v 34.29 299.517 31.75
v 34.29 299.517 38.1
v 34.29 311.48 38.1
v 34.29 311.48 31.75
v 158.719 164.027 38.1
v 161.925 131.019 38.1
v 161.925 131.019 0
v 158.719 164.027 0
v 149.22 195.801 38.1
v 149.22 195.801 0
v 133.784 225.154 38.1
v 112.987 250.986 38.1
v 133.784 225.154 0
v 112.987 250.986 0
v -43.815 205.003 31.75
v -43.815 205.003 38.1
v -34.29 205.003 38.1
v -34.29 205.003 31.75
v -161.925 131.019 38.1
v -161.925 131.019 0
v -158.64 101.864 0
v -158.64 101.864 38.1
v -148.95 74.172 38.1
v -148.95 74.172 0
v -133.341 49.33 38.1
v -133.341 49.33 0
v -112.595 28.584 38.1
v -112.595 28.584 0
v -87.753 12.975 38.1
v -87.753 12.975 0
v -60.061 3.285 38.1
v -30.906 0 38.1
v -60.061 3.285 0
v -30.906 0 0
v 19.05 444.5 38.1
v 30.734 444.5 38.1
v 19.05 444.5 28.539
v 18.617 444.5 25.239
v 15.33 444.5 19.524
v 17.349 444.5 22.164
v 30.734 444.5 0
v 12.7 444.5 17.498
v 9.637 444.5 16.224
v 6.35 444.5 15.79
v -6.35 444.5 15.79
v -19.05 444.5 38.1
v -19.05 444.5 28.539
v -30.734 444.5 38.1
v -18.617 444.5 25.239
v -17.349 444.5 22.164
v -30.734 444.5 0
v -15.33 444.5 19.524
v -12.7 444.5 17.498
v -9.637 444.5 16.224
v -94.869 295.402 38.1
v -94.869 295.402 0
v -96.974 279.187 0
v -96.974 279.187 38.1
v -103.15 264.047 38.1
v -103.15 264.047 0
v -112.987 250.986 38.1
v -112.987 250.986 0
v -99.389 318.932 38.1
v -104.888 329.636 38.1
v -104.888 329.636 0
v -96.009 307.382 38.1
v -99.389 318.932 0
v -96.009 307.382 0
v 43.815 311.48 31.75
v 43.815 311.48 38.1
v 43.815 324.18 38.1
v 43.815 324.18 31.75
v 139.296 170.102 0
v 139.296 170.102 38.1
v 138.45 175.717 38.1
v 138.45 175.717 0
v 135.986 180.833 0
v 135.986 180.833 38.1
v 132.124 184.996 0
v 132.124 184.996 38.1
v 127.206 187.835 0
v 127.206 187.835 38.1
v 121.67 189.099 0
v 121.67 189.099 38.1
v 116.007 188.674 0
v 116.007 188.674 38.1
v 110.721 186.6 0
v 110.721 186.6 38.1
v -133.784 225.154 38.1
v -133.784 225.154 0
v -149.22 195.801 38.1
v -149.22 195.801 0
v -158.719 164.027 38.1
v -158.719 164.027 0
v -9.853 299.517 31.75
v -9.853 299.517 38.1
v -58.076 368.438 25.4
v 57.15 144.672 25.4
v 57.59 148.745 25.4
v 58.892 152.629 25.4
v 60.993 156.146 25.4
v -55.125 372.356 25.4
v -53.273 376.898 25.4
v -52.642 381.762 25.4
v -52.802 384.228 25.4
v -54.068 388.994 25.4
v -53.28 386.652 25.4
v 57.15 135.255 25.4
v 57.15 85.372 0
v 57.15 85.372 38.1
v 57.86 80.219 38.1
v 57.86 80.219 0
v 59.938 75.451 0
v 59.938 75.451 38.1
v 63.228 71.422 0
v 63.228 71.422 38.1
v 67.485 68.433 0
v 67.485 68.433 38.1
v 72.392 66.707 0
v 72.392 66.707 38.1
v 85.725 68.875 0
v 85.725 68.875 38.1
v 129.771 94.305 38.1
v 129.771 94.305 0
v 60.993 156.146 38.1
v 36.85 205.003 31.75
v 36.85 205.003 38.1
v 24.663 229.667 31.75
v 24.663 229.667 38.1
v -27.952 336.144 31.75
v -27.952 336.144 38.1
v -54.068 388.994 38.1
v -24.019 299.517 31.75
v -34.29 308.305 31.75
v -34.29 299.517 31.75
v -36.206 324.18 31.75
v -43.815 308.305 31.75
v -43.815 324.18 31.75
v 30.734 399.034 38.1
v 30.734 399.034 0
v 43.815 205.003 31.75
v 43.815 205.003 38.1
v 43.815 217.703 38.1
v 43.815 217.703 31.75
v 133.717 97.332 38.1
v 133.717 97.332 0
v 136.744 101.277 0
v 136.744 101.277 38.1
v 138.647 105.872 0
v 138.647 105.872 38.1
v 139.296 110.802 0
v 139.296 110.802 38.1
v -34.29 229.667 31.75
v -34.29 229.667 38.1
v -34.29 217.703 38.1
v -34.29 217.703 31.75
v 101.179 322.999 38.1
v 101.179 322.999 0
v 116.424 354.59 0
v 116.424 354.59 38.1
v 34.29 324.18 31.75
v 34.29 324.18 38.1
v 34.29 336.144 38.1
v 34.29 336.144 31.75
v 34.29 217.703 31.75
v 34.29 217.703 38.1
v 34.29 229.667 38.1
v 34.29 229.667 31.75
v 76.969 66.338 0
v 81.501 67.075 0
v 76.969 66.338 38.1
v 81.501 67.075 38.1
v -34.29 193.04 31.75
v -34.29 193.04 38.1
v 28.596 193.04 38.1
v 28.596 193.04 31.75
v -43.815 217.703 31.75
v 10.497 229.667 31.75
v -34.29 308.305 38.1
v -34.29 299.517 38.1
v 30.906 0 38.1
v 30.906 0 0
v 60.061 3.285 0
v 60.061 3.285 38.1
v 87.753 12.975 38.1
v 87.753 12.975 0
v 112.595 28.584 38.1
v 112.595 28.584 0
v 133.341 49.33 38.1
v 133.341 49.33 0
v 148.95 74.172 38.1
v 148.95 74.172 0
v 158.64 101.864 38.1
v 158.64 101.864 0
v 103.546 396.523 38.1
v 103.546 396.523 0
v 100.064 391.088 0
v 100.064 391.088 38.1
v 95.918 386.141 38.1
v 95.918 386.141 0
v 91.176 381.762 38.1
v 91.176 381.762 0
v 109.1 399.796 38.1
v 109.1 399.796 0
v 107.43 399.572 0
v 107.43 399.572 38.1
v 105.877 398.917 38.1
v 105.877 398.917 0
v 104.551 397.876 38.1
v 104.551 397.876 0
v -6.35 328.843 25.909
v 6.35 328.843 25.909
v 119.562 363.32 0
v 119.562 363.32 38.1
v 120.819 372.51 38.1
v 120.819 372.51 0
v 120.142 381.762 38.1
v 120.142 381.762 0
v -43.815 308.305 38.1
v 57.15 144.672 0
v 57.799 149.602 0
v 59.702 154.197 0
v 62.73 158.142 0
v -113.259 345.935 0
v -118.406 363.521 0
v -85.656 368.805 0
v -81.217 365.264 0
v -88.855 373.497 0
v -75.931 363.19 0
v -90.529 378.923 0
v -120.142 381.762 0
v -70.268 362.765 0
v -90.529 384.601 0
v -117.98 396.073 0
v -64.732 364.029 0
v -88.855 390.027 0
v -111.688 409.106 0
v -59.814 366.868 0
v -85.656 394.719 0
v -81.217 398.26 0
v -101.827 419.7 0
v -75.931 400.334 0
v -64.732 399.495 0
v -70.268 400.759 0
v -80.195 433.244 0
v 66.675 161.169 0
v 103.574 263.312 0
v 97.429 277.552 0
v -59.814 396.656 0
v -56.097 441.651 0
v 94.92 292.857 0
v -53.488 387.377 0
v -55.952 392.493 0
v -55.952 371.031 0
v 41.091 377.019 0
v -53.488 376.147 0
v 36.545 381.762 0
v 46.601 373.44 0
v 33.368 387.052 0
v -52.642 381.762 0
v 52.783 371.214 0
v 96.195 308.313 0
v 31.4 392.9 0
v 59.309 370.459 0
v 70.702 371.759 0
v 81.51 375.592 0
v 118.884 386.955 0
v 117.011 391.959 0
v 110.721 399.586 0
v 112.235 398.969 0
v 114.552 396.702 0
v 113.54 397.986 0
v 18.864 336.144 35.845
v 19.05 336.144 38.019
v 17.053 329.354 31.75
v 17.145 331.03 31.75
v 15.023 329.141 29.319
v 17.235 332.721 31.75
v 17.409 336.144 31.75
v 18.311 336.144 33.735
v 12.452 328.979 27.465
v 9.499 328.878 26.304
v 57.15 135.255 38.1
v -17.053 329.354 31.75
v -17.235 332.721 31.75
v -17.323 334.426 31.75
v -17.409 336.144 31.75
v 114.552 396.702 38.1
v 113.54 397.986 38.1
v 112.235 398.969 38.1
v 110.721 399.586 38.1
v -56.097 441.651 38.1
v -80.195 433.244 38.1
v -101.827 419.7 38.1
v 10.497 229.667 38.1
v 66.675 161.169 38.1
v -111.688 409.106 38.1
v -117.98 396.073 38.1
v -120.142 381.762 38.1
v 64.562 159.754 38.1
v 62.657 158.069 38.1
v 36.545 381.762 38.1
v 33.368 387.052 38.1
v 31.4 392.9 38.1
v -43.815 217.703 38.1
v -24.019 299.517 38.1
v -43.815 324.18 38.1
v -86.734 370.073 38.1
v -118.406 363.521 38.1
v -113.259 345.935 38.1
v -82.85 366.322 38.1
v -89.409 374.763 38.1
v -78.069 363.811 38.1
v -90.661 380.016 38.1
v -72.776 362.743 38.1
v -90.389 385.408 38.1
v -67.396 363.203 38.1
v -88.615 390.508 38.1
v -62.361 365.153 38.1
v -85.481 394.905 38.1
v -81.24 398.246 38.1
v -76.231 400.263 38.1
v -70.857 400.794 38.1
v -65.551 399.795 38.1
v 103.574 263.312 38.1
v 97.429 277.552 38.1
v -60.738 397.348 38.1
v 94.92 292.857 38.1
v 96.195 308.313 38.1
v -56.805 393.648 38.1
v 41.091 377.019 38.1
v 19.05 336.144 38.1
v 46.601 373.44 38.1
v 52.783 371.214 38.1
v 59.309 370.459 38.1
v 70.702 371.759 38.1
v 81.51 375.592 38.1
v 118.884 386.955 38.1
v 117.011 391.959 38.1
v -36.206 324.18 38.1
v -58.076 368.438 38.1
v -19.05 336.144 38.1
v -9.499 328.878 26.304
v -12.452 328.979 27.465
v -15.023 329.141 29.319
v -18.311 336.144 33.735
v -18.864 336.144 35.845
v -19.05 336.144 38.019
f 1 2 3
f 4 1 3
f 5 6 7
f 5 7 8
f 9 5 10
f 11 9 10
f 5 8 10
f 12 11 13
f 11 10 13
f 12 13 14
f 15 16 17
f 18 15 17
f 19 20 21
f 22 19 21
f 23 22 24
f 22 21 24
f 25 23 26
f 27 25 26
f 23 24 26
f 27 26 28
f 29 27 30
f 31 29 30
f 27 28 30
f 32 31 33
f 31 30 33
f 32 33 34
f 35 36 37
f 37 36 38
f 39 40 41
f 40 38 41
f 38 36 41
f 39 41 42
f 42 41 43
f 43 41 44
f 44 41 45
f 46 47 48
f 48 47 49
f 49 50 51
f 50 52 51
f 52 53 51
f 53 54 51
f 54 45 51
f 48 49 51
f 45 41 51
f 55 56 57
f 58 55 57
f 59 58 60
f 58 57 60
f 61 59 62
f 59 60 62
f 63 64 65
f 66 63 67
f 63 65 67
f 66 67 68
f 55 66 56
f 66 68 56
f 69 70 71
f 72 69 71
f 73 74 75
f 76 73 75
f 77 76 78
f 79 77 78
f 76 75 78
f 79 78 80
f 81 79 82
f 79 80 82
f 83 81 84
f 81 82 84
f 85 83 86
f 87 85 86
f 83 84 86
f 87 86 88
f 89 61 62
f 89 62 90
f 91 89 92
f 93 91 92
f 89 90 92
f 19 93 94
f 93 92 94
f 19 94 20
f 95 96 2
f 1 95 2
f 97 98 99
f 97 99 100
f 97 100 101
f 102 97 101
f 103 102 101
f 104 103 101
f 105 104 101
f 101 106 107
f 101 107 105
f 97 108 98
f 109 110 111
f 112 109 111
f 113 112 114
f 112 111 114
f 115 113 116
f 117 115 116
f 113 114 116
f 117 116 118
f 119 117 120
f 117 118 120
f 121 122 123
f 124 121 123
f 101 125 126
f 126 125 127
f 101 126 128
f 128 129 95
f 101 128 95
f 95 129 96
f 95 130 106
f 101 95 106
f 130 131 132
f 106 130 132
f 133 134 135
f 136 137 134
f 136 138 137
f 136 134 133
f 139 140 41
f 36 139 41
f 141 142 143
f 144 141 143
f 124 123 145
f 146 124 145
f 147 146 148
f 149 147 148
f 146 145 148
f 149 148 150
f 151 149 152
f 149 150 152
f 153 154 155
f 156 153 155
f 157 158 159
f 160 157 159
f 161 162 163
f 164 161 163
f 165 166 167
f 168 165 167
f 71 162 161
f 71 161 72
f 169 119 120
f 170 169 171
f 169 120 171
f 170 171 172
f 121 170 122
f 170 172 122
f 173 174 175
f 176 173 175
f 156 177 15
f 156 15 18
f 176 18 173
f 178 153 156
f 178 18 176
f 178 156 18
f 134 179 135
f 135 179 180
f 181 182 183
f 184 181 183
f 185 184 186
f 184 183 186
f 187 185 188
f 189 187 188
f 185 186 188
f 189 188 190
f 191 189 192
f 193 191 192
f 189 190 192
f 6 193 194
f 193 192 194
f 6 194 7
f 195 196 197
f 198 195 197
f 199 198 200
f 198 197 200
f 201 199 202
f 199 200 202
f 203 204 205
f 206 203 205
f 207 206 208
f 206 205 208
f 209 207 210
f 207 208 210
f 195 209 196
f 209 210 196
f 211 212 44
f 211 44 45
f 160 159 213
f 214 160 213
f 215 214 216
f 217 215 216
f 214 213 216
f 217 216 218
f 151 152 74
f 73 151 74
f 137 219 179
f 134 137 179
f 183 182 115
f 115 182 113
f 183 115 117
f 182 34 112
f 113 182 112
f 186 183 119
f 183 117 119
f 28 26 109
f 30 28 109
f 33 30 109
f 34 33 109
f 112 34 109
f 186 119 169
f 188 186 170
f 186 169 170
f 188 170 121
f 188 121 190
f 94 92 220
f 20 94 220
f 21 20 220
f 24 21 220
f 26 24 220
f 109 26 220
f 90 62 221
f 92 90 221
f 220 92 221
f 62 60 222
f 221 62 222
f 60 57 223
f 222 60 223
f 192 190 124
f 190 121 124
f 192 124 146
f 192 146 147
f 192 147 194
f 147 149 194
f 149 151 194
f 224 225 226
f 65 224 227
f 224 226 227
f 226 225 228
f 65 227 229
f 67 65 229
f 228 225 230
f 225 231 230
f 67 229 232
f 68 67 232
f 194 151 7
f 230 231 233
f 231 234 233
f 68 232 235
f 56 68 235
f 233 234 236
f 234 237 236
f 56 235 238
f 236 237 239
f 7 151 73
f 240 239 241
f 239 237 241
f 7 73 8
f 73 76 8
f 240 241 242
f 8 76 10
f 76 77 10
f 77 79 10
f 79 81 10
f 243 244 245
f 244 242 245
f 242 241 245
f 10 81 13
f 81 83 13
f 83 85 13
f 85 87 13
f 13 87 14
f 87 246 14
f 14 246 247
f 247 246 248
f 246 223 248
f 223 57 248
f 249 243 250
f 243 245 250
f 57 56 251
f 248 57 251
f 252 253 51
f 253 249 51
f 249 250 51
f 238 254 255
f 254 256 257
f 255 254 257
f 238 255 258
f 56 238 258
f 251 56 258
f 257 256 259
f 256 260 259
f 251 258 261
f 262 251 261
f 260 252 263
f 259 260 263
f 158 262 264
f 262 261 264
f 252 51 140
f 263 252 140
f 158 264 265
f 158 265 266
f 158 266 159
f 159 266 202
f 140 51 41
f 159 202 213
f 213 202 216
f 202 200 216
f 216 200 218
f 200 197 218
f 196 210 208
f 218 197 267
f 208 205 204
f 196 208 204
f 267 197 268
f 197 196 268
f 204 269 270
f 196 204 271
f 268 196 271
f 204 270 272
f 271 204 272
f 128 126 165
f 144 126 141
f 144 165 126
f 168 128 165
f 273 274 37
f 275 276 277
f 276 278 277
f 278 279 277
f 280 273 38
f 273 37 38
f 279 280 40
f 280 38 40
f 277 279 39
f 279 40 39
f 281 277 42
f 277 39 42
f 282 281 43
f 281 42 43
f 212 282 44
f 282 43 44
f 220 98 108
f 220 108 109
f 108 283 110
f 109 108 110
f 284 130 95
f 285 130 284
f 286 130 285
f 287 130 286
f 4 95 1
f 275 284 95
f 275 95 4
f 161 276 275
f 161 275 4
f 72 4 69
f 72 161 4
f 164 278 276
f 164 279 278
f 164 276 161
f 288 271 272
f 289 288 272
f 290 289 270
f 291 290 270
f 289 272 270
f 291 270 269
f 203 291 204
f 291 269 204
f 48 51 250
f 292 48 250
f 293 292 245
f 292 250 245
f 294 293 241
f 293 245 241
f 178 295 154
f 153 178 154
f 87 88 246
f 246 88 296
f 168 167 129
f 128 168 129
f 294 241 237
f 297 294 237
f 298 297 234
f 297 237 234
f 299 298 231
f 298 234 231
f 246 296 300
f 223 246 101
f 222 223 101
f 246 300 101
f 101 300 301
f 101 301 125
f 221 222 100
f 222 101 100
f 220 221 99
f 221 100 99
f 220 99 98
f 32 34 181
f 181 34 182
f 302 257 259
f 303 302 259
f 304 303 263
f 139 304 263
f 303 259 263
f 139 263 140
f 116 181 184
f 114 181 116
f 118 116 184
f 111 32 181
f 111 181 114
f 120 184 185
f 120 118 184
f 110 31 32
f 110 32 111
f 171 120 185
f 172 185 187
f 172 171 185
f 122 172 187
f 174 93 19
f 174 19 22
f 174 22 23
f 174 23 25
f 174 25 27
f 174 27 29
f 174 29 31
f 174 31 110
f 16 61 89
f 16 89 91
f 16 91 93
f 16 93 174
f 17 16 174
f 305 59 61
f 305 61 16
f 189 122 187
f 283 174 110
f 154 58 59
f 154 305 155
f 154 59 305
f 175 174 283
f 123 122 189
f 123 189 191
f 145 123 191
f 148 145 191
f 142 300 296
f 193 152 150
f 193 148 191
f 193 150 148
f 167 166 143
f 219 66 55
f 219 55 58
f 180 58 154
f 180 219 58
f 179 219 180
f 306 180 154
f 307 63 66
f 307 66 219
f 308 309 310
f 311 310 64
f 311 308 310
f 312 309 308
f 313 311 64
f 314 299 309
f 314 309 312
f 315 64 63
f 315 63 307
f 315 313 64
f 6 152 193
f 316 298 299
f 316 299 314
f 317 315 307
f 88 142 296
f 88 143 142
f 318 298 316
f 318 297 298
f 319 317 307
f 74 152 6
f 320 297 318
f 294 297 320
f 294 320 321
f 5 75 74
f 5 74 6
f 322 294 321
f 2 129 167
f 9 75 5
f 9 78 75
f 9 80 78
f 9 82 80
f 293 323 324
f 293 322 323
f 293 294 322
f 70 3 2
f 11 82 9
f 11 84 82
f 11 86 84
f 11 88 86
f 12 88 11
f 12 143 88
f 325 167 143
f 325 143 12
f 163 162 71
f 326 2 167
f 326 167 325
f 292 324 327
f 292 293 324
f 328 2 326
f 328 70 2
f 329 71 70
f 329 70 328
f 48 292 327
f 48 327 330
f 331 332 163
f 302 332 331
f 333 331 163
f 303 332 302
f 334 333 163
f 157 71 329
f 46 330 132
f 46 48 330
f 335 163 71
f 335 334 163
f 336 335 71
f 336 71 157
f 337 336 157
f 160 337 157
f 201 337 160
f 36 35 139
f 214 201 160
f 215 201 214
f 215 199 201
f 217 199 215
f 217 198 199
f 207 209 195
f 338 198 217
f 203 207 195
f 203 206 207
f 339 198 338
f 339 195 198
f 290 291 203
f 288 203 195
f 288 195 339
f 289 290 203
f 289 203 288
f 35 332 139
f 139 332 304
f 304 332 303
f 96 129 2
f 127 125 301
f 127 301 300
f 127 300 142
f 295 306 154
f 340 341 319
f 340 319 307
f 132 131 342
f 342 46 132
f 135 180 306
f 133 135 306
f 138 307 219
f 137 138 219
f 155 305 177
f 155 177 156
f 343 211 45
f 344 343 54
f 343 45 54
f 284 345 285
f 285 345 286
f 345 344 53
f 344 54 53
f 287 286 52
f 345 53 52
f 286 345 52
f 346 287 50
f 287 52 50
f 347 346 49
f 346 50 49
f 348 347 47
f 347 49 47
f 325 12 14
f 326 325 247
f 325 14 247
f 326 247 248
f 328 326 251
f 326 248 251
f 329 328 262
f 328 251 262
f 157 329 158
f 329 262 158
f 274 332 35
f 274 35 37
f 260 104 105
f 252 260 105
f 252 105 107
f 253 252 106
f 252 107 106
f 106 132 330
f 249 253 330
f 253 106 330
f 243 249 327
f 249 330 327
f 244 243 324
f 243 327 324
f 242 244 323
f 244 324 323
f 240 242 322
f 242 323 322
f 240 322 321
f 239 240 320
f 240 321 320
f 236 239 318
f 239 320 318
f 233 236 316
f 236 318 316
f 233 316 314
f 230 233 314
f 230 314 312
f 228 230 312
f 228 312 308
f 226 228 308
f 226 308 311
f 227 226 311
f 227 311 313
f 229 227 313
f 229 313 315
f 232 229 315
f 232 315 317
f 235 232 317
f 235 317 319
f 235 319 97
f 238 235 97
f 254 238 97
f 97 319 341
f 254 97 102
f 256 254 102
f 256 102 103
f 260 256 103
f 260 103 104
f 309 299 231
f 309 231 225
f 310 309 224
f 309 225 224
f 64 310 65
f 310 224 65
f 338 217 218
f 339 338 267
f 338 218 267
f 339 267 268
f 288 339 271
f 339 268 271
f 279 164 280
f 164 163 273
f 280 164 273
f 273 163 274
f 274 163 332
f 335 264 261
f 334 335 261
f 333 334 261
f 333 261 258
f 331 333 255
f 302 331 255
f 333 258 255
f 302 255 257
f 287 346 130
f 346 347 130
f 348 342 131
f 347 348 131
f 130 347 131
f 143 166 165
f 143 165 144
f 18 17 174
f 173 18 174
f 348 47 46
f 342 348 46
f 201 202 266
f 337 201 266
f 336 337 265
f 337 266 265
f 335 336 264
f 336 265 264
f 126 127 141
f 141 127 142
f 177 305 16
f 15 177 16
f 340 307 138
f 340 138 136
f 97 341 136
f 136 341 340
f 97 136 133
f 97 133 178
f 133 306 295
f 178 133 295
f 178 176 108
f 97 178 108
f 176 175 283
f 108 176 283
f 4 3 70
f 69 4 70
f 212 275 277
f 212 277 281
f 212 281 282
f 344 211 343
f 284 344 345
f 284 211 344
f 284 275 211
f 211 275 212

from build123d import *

# Parameters (mm, degrees)
F2_DEPTH  = 38.1
F4_R      = 19.05
F5_DEPTH  = 38.101
F11_DEPTH = 117.475
F12_W     = 9.525
F12_H     = 6.35
F13_DEPTH = 6.35
F15_DEPTH = 12.7


# Not quite as in the source:
# - a feature of the source that left no trace in its solid (it failed there, or was rolled back) is left out


with BuildPart() as f2:
    # F1 (on Top) → F2 (new body)
    with BuildSketch(Plane.XY):
        with BuildLine():
            Line((-120.142, 381.762), (0, 381.762))
            Line((0, 381.762), (0, 444.5))
            Line((0, 444.5), (-30.734, 444.5))
            ThreePointArc((-30.734, 444.5), (-68.3812374672, 438.1220807393), (-101.8270568949, 419.700096432))
            ThreePointArc((-101.8270568949, 419.700096432), (-115.3236770577, 402.8258096141), (-120.142, 381.762))
        make_face()
        with BuildLine():
            Line((0, 444.5), (0, 381.762))
            Line((0, 381.762), (36.5448035283, 381.762))
            ThreePointArc((36.5448035283, 381.762), (32.2256329717, 389.9223670283), (30.734, 399.034))
            Line((30.734, 399.034), (30.734, 444.5))
            Line((30.734, 444.5), (0, 444.5))
        make_face()
        with BuildLine():
            Line((0, 381.762), (0, 295.402))
            Line((0, 295.402), (94.869, 295.402))
            ThreePointArc((94.869, 295.402), (96.466719449, 309.5567752573), (101.1794775617, 322.9992557201))
            Line((101.1794775617, 322.9992557201), (116.4239761752, 354.5902807248))
            ThreePointArc((116.4239761752, 354.5902807248), (120.430931673, 367.882227955), (120.142, 381.762))
            Line((120.142, 381.762), (91.175550227, 381.762))
            ThreePointArc((91.175550227, 381.762), (76.2148779155, 373.3684407202), (59.309, 370.459))
            ThreePointArc((59.309, 370.459), (46.6010649789, 373.440270055), (36.5448035283, 381.762))
            Line((36.5448035283, 381.762), (0, 381.762))
        make_face()
        with BuildLine():
            ThreePointArc((103.5459630182, 396.5232874828), (98.0699350262, 388.5483304334), (91.175550227, 381.762))
            Line((91.175550227, 381.762), (120.142, 381.762))
            ThreePointArc((120.142, 381.762), (118.0226976621, 389.4849479409), (114.552023257, 396.7022733785))
            ThreePointArc((114.552023257, 396.7022733785), (112.2345927331, 398.9686730826), (109.1004928586, 399.796))
            ThreePointArc((109.1004928586, 399.796), (105.8770068198, 398.9169814255), (103.5459630182, 396.5232874828))
        make_face()
        with BuildLine():
            Line((94.869, 295.402), (0, 295.402))
            Line((0, 295.402), (0, 0))
            Line((0, 0), (30.906359714, 0))
            ThreePointArc((30.906359714, 0), (123.5505287221, 38.3744712779), (161.925, 131.018640286))
            ThreePointArc((161.925, 131.018640286), (149.2199863218, 195.80132063), (112.9871937272, 250.9864434976))
            ThreePointArc((112.9871937272, 250.9864434976), (99.5727641582, 271.4175748279), (94.869, 295.402))
        make_face()
        with BuildLine():
            Line((0, 295.402), (-94.869, 295.402))
            ThreePointArc((-94.869, 295.402), (-99.5727641582, 271.4175748279), (-112.9871937272, 250.9864434976))
            ThreePointArc((-112.9871937272, 250.9864434976), (-149.2199863218, 195.80132063), (-161.925, 131.018640286))
            ThreePointArc((-161.925, 131.018640286), (-123.5505287221, 38.3744712779), (-30.906359714, 0))
            Line((-30.906359714, 0), (0, 0))
            Line((0, 0), (0, 295.402))
        make_face()
        with BuildLine():
            ThreePointArc((-104.887559724, 329.6362744337), (-97.4250853837, 313.2370573657), (-94.869, 295.402))
            Line((-94.869, 295.402), (0, 295.402))
            Line((0, 295.402), (0, 381.762))
            Line((0, 381.762), (-120.142, 381.762))
            ThreePointArc((-120.142, 381.762), (-116.2500581541, 354.6060190108), (-104.887559724, 329.6362744337))
        make_face()
    extrude(amount=F2_DEPTH)

    # F4 (on face) → F5 (cut, through all)
    with BuildSketch(Plane.XY.offset(38.1)):
        with Locations((-71.6915, 381.762)):
            Circle(F4_R)
        with BuildLine():
            Line((139.2962010965, 110.8024764079), (139.2962010965, 170.1017752607))
            ThreePointArc((139.2962010965, 170.1017752607), (129.7712010965, 186.5995592028), (110.7212010965, 186.5995592028))
            Line((110.7212010965, 186.5995592028), (66.675, 161.169473143))
            ThreePointArc((66.675, 161.169473143), (59.7022160579, 154.1966892009), (57.15, 144.6716892009))
            Line((57.15, 144.6716892009), (57.15, 108.5037669007))
            Line((57.15, 108.5037669007), (69.5417475728, 132.0304736397))
            ThreePointArc((69.5417475728, 132.0304736397), (65.9030700587, 154.5765309479), (88.5733379566, 151.8154392009))
            Line((88.5733379566, 151.8154392009), (107.8728631399, 162.9580252607))
            ThreePointArc((107.8728631399, 162.9580252607), (116.5483239896, 183.9024405039), (134.5337010965, 170.1017752607))
            ThreePointArc((134.5337010965, 170.1017752607), (130.3489892327, 159.9989871245), (120.2462010965, 155.8142752607))
            Line((120.2462010965, 155.8142752607), (120.2462010965, 125.0899764079))
            ThreePointArc((120.2462010965, 125.0899764079), (130.3489892327, 120.9052645441), (134.5337010965, 110.8024764079))
            ThreePointArc((134.5337010965, 110.8024764079), (125.4430565732, 97.4936316269), (109.7392514861, 101.1207066247))
            Line((109.7392514861, 101.1207066247), (90.3263274862, 83.23240717))
            ThreePointArc((90.3263274862, 83.23240717), (85.8817697832, 74.8654407377), (77.1799912803, 71.1185391723))
            Line((77.1799912803, 71.1185391723), (72.3922577123, 66.7068177967))
            ThreePointArc((72.3922577123, 66.7068177967), (79.2572186381, 66.5693077763), (85.725, 68.874606406))
            Line((85.725, 68.874606406), (129.7712010965, 94.3046924658))
            ThreePointArc((129.7712010965, 94.3046924658), (136.7439850386, 101.2774764079), (139.2962010965, 110.8024764079))
        make_face()
        with BuildLine():
            Line((69.5417475728, 132.0304736397), (57.15, 108.5037669007))
            Line((57.15, 108.5037669007), (57.15, 85.3723903481))
            ThreePointArc((57.15, 85.3723903481), (61.4446621425, 73.3232200567), (72.3922577123, 66.7068177967))
            Line((72.3922577123, 66.7068177967), (77.1799912803, 71.1185391723))
            ThreePointArc((77.1799912803, 71.1185391723), (85.8817697832, 74.8654407377), (90.3263274862, 83.23240717))
            Line((90.3263274862, 83.23240717), (109.7392514861, 101.1207066247))
            ThreePointArc((109.7392514861, 101.1207066247), (125.4430565732, 97.4936316269), (134.5337010965, 110.8024764079))
            ThreePointArc((134.5337010965, 110.8024764079), (130.3489892327, 120.9052645441), (120.2462010965, 125.0899764079))
            Line((120.2462010965, 125.0899764079), (120.2462010965, 155.8142752607))
            ThreePointArc((120.2462010965, 155.8142752607), (130.3489892327, 159.9989871245), (134.5337010965, 170.1017752607))
            ThreePointArc((134.5337010965, 170.1017752607), (116.5483239896, 183.9024405039), (107.8728631399, 162.9580252607))
            Line((107.8728631399, 162.9580252607), (88.5733379566, 151.8154392009))
            ThreePointArc((88.5733379566, 151.8154392009), (65.9030700587, 154.5765309479), (69.5417475728, 132.0304736397))
        make_face()
    extrude(amount=-F5_DEPTH, mode=Mode.SUBTRACT)

    # F10 (on face) → F11 (cut)
    with BuildSketch(Plane(origin=(0, 441.123523107, -38.5933074865), x_dir=(-1, 0, 0), z_dir=(0, 0.9961946981, -0.0871557427))):
        with BuildLine():
            Line((19.05, 76.6957456486), (-19.05, 76.6957456486))
            Line((-19.05, 76.6957456486), (-19.05, 67.1707456486))
            ThreePointArc((-19.05, 67.1707456486), (-15.3302561211, 58.1904895276), (-6.35, 54.4707456486))
            Line((-6.35, 54.4707456486), (0, 54.4707456486))
            Line((0, 54.4707456486), (6.35, 54.4707456486))
            ThreePointArc((6.35, 54.4707456486), (15.3302561211, 58.1904895276), (19.05, 67.1707456486))
            Line((19.05, 67.1707456486), (19.05, 76.6957456486))
        make_face()
    extrude(amount=-F11_DEPTH, mode=Mode.SUBTRACT)

    # F12 (on face) → F13 (cut)
    with BuildSketch(Plane.XY.offset(38.1)):
        Polygon((-34.29, 299.5168), (0, 299.5168), (0, 317.8302), (-34.29, 317.8302), (-34.29, 311.4802), (-34.29, 308.3052), align=None)
        Polygon((0, 317.8302), (0, 299.5168), (34.29, 299.5168), (34.29, 311.4802), (34.29, 317.8302), align=None)
        Polygon((0, 229.6668), (-34.29, 229.6668), (-34.29, 217.7034), (-34.29, 211.3534), (0, 211.3534), align=None)
        Polygon((34.29, 229.6668), (0, 229.6668), (0, 211.3534), (34.29, 211.3534), (34.29, 217.7034), align=None)
        with Locations((-39.0525, 214.5284)):
            Rectangle(F12_W, F12_H)
        Polygon((34.29, 211.3534), (0, 211.3534), (0, 193.04), (34.29, 193.04), (34.29, 205.0034), align=None)
        Polygon((0, 193.04), (0, 211.3534), (-34.29, 211.3534), (-34.29, 205.0034), (-34.29, 193.04), align=None)
        with Locations((-39.0525, 208.1784)):
            Rectangle(F12_W, F12_H)
        with Locations((39.0525, 214.5284)):
            Rectangle(F12_W, F12_H)
        Polygon((0, 336.1436), (0, 317.8302), (34.29, 317.8302), (34.29, 324.1802), (34.29, 336.1436), align=None)
        Polygon((-34.29, 317.8302), (0, 317.8302), (0, 336.1436), (-34.29, 336.1436), (-34.29, 324.1802), align=None)
        with Locations((39.0525, 208.1784)):
            Rectangle(F12_W, F12_H)
        Polygon((-43.815, 308.3052), (-34.29, 308.3052), (-34.29, 311.4802), (-34.29, 317.8302), (-43.815, 317.8302), (-43.815, 311.4802), align=None)
        with Locations((39.0525, 314.6552)):
            Rectangle(F12_W, F12_H)
        with Locations((39.0525, 321.0052)):
            Rectangle(F12_W, F12_H)
        with Locations((-39.0525, 321.0052)):
            Rectangle(F12_W, F12_H)
    extrude(amount=-F13_DEPTH, mode=Mode.SUBTRACT)

    # F14 (on face) → F15 (cut)
    with BuildSketch(Plane.XY.offset(38.1)):
        with BuildLine():
            Line((-54.0675192427, 388.9937219434), (-58.0760770823, 368.4382333114))
            Line((-58.0760770823, 368.4382333114), (57.15, 135.255))
            Line((57.15, 135.255), (57.15, 144.6716892009))
            ThreePointArc((57.15, 144.6716892009), (58.1362792436, 150.7218538627), (60.9929913317, 156.1455458918))
            Line((60.9929913317, 156.1455458918), (-54.0675192427, 388.9937219434))
        make_face()
    extrude(amount=-F15_DEPTH, mode=Mode.SUBTRACT)


solid = f2.part
